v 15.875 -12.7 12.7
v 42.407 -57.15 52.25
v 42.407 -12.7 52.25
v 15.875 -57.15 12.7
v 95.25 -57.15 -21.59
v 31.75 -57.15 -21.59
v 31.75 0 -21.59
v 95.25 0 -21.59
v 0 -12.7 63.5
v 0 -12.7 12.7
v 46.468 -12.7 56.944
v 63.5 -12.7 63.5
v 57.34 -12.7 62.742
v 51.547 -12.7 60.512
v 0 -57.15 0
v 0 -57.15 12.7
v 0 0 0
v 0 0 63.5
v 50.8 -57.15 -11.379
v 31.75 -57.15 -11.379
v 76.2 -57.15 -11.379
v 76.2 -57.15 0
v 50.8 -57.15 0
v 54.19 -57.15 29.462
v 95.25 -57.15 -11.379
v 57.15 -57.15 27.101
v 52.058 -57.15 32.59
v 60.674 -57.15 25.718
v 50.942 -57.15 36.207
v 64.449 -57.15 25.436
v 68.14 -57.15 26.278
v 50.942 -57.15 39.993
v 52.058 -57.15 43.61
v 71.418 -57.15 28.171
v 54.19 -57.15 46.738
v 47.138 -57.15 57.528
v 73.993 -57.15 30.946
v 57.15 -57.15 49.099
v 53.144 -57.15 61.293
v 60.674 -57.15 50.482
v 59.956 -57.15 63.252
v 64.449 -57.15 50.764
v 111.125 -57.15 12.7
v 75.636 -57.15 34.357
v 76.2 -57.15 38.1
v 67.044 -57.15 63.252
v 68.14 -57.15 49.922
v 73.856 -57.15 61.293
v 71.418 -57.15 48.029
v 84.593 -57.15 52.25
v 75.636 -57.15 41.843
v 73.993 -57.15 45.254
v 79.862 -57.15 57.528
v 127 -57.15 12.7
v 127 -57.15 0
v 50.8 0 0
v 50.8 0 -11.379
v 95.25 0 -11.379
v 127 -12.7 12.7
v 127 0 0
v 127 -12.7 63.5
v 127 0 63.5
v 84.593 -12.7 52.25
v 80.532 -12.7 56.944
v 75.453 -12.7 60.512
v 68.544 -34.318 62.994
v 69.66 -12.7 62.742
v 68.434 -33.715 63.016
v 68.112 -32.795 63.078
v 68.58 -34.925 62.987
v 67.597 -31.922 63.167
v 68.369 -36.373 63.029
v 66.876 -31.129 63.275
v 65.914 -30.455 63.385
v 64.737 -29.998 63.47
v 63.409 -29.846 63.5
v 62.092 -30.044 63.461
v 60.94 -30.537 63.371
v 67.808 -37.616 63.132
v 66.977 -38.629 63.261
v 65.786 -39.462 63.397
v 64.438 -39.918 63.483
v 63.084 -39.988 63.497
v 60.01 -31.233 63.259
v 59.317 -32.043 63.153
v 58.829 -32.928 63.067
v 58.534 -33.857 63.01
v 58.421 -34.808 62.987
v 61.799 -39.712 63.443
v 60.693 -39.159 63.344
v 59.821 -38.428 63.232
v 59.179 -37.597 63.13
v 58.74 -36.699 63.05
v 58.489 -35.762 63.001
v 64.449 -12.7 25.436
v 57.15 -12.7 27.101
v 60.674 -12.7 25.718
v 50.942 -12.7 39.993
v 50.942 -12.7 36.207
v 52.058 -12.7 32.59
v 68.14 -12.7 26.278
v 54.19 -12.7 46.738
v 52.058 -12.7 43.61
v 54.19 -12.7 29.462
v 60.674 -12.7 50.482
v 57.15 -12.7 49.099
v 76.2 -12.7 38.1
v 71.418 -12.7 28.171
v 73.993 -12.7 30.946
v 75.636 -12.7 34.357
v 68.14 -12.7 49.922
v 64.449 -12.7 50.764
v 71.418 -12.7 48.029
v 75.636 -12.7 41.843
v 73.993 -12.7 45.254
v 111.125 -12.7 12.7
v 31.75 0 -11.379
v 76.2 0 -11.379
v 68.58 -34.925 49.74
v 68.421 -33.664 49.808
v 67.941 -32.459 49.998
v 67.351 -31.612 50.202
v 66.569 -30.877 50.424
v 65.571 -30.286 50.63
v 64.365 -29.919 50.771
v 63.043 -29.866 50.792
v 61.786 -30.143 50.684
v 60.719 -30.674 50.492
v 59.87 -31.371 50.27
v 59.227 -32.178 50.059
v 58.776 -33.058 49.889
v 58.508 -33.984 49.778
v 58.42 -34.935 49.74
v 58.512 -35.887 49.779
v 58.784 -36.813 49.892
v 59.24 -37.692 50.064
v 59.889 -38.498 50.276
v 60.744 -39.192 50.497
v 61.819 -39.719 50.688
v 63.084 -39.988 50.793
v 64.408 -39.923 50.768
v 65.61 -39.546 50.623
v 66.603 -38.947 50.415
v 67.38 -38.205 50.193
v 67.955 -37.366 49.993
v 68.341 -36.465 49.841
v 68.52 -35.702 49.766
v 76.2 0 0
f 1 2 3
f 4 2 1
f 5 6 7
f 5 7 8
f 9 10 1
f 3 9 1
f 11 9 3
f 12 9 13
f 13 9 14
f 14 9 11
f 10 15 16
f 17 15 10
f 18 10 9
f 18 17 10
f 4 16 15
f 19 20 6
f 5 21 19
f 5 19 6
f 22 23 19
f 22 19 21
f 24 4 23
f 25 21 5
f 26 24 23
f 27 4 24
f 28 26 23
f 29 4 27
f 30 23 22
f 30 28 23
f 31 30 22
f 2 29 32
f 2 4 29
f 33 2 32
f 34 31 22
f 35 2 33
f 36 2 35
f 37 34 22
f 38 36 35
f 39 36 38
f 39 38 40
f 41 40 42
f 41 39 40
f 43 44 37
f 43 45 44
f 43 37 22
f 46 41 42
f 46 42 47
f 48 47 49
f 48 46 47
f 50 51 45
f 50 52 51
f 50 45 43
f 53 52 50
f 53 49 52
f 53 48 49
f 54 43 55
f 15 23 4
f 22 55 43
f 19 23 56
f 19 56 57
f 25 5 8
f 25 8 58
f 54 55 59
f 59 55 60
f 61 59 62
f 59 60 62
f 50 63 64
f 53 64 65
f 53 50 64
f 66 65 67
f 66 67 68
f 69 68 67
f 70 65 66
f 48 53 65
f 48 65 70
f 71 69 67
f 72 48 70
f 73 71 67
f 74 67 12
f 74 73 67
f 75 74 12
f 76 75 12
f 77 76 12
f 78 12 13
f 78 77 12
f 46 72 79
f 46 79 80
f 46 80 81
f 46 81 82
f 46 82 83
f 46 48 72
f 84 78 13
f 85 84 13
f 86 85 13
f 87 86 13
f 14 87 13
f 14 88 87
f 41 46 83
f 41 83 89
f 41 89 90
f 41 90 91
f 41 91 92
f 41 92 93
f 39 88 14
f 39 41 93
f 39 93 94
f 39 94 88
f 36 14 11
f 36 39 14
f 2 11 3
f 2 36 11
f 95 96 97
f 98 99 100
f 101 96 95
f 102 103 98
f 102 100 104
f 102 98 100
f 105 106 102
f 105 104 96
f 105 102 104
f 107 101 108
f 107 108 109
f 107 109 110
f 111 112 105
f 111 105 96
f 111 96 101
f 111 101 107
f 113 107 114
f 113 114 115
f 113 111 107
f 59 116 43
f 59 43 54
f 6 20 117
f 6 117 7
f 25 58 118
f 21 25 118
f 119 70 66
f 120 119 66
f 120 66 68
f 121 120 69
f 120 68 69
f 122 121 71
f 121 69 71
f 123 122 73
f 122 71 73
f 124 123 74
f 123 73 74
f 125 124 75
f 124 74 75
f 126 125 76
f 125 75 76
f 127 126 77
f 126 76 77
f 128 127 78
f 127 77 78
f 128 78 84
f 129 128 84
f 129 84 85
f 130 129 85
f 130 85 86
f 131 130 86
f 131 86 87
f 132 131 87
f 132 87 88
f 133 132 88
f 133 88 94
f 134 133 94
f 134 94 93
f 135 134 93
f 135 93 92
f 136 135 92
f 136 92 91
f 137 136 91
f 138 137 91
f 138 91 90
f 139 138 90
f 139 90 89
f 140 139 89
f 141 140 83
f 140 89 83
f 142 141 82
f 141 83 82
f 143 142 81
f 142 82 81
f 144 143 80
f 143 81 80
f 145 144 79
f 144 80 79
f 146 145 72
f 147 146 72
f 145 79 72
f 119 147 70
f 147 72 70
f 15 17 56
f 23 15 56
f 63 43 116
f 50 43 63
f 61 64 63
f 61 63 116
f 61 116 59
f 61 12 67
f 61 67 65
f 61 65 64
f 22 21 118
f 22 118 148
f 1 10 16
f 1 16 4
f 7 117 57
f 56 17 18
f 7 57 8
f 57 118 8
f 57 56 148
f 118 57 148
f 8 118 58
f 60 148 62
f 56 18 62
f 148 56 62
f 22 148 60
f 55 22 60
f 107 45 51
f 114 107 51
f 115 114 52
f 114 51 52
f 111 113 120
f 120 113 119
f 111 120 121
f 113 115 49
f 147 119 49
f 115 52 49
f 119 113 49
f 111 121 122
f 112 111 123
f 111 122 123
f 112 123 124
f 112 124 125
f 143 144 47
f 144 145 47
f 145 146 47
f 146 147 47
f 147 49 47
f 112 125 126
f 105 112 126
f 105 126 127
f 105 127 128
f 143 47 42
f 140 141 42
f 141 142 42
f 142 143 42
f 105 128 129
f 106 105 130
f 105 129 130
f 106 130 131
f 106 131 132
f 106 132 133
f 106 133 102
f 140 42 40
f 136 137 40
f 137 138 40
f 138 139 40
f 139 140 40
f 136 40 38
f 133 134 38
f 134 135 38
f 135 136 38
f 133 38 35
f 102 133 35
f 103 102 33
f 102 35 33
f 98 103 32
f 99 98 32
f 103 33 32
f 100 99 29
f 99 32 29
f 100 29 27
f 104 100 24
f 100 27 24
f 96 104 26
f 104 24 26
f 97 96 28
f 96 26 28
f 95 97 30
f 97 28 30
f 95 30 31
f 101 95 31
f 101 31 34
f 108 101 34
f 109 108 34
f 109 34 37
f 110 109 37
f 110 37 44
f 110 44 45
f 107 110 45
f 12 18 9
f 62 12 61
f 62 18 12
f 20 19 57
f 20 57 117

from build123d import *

# Parameters (mm, degrees)
F0_W     = 127
F0_H     = 63.5
F1_DEPTH = 12.7
F2_W     = 127
F2_H     = 12.7
F3_DEPTH = 44.45
F5_DEPTH = 57.15
F6_R     = 12.7
F7_DEPTH = 44.45
F8_R     = 5.08
F9_DEPTH = 25.4


with BuildPart() as f1:
    # F0 (on Front) → F1 (new body)
    with BuildSketch(Plane.XZ):
        with Locations((63.5, 31.75)):
            Rectangle(F0_W, F0_H)
    extrude(amount=F1_DEPTH)

    # F2 (on face) → F3 (join)
    with BuildSketch(Plane.XZ.offset(12.7)):
        with Locations((63.5, 6.35)):
            Rectangle(F2_W, F2_H)
    extrude(amount=F3_DEPTH)

    # F4 (on face) → F5 (join)
    with BuildSketch(Plane.XZ.offset(57.15)):
        Polygon((31.75, -21.59), (63.5, -21.59), (95.25, -21.59), (95.25, -11.3792), (76.2, -11.3792), (76.2, 0), (63.5, 0), (50.8, 0), (50.8, -11.3792), (31.75, -11.3792), align=None)
    extrude(amount=-F5_DEPTH)

    # F6 (on face) → F7 (join)
    with BuildSketch(Plane.XZ.offset(57.15)):
        with BuildLine():
            Line((42.406574, 52.250173), (15.875, 12.7))
            Line((15.875, 12.7), (111.125, 12.7))
            Line((111.125, 12.7), (84.593426, 52.250173))
            ThreePointArc((84.593426, 52.250173), (63.5, 63.5), (42.406574, 52.250173))
        make_face()
        with Locations((63.5, 38.1)):
            Circle(F6_R, mode=Mode.SUBTRACT)
    extrude(amount=-F7_DEPTH)

    # F8 (on face) → F9 (cut)
    with BuildSketch(Plane.XY.offset(63.5)):
        with Locations((63.5, -34.925)):
            Circle(F8_R)
    extrude(amount=-F9_DEPTH, mode=Mode.SUBTRACT)


solid = f1.part
